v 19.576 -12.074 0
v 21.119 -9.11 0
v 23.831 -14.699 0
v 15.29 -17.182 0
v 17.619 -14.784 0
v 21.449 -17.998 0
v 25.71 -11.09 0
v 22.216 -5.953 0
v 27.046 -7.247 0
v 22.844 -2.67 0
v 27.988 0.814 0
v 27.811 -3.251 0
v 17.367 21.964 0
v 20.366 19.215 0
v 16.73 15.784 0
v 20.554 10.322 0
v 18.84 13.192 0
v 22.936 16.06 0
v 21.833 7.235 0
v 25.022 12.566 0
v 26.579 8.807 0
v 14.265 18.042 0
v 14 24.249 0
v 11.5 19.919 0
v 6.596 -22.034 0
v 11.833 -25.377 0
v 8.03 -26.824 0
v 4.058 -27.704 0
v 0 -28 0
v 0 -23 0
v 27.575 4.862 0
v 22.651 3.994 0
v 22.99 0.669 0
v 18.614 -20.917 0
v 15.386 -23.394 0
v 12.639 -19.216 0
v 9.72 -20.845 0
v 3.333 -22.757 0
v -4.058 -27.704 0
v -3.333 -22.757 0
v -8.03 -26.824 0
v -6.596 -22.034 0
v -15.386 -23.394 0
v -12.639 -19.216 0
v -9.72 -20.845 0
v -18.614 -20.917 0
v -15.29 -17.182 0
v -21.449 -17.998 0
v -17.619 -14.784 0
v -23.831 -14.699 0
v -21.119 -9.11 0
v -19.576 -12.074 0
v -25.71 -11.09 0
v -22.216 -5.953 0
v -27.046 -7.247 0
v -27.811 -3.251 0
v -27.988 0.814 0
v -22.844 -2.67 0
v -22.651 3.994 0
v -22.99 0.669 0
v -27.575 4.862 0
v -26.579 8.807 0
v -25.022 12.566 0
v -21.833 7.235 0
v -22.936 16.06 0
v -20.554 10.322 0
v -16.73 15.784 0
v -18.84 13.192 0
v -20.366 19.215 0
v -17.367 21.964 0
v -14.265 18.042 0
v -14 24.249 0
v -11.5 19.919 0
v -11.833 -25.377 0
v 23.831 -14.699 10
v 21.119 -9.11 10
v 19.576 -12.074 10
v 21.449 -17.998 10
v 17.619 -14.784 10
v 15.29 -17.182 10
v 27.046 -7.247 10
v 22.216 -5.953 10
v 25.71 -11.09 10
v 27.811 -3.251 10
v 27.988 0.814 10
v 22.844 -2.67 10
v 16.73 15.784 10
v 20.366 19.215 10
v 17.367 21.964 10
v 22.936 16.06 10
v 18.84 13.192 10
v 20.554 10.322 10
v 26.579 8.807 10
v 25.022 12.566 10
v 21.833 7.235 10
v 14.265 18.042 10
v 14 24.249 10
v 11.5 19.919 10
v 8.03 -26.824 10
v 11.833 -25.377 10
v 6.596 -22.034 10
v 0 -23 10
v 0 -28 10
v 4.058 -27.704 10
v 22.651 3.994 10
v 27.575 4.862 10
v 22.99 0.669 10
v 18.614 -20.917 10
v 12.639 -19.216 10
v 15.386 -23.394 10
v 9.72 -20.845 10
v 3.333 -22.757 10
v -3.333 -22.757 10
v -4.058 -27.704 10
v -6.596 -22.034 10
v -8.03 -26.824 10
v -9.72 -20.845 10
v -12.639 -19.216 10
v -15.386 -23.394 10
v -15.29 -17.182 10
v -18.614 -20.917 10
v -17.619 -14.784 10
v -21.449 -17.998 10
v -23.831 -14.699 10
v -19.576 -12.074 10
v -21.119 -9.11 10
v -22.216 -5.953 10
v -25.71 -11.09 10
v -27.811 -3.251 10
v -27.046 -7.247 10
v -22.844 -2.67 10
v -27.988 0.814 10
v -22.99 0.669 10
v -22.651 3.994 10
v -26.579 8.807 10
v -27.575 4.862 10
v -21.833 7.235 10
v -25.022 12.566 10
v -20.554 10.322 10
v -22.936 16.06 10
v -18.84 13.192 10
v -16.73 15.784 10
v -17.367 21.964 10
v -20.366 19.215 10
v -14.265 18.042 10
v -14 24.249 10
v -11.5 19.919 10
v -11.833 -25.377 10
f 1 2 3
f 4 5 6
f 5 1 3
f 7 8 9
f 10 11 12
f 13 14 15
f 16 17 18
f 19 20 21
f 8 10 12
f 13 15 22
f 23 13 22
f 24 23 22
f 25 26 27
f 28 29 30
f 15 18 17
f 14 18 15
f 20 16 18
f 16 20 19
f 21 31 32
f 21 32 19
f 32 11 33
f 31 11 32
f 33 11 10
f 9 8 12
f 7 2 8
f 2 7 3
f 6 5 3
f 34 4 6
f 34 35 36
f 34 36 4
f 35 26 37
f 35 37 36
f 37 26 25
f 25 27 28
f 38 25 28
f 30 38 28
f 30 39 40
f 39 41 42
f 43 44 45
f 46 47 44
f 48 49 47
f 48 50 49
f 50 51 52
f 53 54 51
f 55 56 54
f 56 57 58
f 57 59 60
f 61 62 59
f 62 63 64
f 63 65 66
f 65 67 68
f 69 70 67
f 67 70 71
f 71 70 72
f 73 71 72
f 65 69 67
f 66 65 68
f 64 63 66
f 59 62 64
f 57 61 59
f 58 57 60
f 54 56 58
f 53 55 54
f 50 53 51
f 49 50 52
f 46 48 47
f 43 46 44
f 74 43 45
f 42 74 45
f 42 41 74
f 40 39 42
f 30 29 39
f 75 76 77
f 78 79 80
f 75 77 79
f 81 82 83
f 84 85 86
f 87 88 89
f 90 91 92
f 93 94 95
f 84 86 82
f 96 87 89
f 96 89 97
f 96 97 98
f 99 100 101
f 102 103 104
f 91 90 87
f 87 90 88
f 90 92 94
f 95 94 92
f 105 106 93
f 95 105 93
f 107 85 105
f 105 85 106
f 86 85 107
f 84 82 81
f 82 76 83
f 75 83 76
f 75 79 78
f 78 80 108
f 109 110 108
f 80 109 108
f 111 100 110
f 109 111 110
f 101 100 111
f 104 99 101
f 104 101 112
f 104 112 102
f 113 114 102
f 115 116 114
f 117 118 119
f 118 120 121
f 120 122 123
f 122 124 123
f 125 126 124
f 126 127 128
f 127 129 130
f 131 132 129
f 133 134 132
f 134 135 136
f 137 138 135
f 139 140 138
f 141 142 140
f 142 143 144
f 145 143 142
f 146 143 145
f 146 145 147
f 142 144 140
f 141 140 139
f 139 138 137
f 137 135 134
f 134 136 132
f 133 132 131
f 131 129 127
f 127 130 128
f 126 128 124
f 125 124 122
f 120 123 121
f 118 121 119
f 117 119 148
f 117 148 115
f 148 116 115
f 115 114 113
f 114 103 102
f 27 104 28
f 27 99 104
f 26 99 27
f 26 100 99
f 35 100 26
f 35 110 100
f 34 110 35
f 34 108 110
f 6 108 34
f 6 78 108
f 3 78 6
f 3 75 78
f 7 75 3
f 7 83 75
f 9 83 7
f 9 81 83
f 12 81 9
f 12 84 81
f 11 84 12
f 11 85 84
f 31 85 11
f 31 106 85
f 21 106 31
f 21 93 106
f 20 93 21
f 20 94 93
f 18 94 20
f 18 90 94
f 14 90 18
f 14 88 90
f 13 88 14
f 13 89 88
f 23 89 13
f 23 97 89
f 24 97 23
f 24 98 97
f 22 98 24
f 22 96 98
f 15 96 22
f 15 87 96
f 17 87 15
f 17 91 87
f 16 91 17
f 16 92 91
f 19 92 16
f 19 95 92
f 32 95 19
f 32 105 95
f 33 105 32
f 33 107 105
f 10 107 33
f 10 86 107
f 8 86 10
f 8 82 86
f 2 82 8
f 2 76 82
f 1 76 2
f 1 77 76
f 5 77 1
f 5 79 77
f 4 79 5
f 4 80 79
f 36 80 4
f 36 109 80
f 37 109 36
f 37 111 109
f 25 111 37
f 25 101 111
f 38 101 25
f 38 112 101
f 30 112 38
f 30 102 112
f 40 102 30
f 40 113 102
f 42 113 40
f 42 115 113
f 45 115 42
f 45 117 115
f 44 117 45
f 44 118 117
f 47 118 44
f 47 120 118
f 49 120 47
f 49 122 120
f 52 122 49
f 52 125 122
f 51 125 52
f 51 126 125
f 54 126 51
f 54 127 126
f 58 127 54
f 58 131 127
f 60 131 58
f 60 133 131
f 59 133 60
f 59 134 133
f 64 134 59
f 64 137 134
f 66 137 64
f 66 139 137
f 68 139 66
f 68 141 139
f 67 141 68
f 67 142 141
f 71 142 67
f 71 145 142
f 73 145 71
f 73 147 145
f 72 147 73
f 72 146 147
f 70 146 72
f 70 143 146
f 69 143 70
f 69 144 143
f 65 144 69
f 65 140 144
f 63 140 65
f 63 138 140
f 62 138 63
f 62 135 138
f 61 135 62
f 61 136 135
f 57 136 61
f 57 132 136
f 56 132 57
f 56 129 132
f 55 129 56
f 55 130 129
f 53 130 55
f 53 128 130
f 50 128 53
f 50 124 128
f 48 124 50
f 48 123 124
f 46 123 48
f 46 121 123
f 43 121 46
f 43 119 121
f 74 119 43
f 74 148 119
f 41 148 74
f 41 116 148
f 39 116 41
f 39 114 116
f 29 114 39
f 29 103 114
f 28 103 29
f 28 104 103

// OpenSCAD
$fn = 32;

// ----------------------------------------------------------------------
// Spring clip: 56 mm outside, 5 mm band, 60 degree opening
// ----------------------------------------------------------------------

// --- parameters (mm) ---
outer_r = 28;             // clip outside radius
inner_r = 23;             // clip bore radius
band = 5;                 // band thickness
clip_w = 10;              // clip width
opening = 60;             // opening angle

clip_profile = [[-14, 24.249], [-17.367, 21.964], [-20.366, 19.215], [-22.936, 16.06], [-25.022, 12.566], [-26.579, 8.807], [-27.575, 4.862], [-27.988, 0.814], [-27.811, -3.251], [-27.046, -7.247], [-25.71, -11.09], [-23.831, -14.699], [-21.449, -17.998], [-18.614, -20.917], [-15.386, -23.394], [-11.833, -25.377], [-8.03, -26.824], [-4.058, -27.704], [0, -28], [4.058, -27.704], [8.03, -26.824], [11.833, -25.377], [15.386, -23.394], [18.614, -20.917], [21.449, -17.998], [23.831, -14.699], [25.71, -11.09], [27.046, -7.247], [27.811, -3.251], [27.988, 0.814], [27.575, 4.862], [26.579, 8.807], [25.022, 12.566], [22.936, 16.06], [20.366, 19.215], [17.367, 21.964], [14, 24.249], [11.5, 19.919], [14.265, 18.042], [16.73, 15.784], [18.84, 13.192], [20.554, 10.322], [21.833, 7.235], [22.651, 3.994], [22.99, 0.669], [22.844, -2.67], [22.216, -5.953], [21.119, -9.11], [19.576, -12.074], [17.619, -14.784], [15.29, -17.182], [12.639, -19.216], [9.72, -20.845], [6.596, -22.034], [3.333, -22.757], [0, -23], [-3.333, -22.757], [-6.596, -22.034], [-9.72, -20.845], [-12.639, -19.216], [-15.29, -17.182], [-17.619, -14.784], [-19.576, -12.074], [-21.119, -9.11], [-22.216, -5.953], [-22.844, -2.67], [-22.99, 0.669], [-22.651, 3.994], [-21.833, 7.235], [-20.554, 10.322], [-18.84, 13.192], [-16.73, 15.784], [-14.265, 18.042], [-11.5, 19.919]];

difference() {
  union() {
    linear_extrude(height = clip_w) polygon(clip_profile);
  }
}
